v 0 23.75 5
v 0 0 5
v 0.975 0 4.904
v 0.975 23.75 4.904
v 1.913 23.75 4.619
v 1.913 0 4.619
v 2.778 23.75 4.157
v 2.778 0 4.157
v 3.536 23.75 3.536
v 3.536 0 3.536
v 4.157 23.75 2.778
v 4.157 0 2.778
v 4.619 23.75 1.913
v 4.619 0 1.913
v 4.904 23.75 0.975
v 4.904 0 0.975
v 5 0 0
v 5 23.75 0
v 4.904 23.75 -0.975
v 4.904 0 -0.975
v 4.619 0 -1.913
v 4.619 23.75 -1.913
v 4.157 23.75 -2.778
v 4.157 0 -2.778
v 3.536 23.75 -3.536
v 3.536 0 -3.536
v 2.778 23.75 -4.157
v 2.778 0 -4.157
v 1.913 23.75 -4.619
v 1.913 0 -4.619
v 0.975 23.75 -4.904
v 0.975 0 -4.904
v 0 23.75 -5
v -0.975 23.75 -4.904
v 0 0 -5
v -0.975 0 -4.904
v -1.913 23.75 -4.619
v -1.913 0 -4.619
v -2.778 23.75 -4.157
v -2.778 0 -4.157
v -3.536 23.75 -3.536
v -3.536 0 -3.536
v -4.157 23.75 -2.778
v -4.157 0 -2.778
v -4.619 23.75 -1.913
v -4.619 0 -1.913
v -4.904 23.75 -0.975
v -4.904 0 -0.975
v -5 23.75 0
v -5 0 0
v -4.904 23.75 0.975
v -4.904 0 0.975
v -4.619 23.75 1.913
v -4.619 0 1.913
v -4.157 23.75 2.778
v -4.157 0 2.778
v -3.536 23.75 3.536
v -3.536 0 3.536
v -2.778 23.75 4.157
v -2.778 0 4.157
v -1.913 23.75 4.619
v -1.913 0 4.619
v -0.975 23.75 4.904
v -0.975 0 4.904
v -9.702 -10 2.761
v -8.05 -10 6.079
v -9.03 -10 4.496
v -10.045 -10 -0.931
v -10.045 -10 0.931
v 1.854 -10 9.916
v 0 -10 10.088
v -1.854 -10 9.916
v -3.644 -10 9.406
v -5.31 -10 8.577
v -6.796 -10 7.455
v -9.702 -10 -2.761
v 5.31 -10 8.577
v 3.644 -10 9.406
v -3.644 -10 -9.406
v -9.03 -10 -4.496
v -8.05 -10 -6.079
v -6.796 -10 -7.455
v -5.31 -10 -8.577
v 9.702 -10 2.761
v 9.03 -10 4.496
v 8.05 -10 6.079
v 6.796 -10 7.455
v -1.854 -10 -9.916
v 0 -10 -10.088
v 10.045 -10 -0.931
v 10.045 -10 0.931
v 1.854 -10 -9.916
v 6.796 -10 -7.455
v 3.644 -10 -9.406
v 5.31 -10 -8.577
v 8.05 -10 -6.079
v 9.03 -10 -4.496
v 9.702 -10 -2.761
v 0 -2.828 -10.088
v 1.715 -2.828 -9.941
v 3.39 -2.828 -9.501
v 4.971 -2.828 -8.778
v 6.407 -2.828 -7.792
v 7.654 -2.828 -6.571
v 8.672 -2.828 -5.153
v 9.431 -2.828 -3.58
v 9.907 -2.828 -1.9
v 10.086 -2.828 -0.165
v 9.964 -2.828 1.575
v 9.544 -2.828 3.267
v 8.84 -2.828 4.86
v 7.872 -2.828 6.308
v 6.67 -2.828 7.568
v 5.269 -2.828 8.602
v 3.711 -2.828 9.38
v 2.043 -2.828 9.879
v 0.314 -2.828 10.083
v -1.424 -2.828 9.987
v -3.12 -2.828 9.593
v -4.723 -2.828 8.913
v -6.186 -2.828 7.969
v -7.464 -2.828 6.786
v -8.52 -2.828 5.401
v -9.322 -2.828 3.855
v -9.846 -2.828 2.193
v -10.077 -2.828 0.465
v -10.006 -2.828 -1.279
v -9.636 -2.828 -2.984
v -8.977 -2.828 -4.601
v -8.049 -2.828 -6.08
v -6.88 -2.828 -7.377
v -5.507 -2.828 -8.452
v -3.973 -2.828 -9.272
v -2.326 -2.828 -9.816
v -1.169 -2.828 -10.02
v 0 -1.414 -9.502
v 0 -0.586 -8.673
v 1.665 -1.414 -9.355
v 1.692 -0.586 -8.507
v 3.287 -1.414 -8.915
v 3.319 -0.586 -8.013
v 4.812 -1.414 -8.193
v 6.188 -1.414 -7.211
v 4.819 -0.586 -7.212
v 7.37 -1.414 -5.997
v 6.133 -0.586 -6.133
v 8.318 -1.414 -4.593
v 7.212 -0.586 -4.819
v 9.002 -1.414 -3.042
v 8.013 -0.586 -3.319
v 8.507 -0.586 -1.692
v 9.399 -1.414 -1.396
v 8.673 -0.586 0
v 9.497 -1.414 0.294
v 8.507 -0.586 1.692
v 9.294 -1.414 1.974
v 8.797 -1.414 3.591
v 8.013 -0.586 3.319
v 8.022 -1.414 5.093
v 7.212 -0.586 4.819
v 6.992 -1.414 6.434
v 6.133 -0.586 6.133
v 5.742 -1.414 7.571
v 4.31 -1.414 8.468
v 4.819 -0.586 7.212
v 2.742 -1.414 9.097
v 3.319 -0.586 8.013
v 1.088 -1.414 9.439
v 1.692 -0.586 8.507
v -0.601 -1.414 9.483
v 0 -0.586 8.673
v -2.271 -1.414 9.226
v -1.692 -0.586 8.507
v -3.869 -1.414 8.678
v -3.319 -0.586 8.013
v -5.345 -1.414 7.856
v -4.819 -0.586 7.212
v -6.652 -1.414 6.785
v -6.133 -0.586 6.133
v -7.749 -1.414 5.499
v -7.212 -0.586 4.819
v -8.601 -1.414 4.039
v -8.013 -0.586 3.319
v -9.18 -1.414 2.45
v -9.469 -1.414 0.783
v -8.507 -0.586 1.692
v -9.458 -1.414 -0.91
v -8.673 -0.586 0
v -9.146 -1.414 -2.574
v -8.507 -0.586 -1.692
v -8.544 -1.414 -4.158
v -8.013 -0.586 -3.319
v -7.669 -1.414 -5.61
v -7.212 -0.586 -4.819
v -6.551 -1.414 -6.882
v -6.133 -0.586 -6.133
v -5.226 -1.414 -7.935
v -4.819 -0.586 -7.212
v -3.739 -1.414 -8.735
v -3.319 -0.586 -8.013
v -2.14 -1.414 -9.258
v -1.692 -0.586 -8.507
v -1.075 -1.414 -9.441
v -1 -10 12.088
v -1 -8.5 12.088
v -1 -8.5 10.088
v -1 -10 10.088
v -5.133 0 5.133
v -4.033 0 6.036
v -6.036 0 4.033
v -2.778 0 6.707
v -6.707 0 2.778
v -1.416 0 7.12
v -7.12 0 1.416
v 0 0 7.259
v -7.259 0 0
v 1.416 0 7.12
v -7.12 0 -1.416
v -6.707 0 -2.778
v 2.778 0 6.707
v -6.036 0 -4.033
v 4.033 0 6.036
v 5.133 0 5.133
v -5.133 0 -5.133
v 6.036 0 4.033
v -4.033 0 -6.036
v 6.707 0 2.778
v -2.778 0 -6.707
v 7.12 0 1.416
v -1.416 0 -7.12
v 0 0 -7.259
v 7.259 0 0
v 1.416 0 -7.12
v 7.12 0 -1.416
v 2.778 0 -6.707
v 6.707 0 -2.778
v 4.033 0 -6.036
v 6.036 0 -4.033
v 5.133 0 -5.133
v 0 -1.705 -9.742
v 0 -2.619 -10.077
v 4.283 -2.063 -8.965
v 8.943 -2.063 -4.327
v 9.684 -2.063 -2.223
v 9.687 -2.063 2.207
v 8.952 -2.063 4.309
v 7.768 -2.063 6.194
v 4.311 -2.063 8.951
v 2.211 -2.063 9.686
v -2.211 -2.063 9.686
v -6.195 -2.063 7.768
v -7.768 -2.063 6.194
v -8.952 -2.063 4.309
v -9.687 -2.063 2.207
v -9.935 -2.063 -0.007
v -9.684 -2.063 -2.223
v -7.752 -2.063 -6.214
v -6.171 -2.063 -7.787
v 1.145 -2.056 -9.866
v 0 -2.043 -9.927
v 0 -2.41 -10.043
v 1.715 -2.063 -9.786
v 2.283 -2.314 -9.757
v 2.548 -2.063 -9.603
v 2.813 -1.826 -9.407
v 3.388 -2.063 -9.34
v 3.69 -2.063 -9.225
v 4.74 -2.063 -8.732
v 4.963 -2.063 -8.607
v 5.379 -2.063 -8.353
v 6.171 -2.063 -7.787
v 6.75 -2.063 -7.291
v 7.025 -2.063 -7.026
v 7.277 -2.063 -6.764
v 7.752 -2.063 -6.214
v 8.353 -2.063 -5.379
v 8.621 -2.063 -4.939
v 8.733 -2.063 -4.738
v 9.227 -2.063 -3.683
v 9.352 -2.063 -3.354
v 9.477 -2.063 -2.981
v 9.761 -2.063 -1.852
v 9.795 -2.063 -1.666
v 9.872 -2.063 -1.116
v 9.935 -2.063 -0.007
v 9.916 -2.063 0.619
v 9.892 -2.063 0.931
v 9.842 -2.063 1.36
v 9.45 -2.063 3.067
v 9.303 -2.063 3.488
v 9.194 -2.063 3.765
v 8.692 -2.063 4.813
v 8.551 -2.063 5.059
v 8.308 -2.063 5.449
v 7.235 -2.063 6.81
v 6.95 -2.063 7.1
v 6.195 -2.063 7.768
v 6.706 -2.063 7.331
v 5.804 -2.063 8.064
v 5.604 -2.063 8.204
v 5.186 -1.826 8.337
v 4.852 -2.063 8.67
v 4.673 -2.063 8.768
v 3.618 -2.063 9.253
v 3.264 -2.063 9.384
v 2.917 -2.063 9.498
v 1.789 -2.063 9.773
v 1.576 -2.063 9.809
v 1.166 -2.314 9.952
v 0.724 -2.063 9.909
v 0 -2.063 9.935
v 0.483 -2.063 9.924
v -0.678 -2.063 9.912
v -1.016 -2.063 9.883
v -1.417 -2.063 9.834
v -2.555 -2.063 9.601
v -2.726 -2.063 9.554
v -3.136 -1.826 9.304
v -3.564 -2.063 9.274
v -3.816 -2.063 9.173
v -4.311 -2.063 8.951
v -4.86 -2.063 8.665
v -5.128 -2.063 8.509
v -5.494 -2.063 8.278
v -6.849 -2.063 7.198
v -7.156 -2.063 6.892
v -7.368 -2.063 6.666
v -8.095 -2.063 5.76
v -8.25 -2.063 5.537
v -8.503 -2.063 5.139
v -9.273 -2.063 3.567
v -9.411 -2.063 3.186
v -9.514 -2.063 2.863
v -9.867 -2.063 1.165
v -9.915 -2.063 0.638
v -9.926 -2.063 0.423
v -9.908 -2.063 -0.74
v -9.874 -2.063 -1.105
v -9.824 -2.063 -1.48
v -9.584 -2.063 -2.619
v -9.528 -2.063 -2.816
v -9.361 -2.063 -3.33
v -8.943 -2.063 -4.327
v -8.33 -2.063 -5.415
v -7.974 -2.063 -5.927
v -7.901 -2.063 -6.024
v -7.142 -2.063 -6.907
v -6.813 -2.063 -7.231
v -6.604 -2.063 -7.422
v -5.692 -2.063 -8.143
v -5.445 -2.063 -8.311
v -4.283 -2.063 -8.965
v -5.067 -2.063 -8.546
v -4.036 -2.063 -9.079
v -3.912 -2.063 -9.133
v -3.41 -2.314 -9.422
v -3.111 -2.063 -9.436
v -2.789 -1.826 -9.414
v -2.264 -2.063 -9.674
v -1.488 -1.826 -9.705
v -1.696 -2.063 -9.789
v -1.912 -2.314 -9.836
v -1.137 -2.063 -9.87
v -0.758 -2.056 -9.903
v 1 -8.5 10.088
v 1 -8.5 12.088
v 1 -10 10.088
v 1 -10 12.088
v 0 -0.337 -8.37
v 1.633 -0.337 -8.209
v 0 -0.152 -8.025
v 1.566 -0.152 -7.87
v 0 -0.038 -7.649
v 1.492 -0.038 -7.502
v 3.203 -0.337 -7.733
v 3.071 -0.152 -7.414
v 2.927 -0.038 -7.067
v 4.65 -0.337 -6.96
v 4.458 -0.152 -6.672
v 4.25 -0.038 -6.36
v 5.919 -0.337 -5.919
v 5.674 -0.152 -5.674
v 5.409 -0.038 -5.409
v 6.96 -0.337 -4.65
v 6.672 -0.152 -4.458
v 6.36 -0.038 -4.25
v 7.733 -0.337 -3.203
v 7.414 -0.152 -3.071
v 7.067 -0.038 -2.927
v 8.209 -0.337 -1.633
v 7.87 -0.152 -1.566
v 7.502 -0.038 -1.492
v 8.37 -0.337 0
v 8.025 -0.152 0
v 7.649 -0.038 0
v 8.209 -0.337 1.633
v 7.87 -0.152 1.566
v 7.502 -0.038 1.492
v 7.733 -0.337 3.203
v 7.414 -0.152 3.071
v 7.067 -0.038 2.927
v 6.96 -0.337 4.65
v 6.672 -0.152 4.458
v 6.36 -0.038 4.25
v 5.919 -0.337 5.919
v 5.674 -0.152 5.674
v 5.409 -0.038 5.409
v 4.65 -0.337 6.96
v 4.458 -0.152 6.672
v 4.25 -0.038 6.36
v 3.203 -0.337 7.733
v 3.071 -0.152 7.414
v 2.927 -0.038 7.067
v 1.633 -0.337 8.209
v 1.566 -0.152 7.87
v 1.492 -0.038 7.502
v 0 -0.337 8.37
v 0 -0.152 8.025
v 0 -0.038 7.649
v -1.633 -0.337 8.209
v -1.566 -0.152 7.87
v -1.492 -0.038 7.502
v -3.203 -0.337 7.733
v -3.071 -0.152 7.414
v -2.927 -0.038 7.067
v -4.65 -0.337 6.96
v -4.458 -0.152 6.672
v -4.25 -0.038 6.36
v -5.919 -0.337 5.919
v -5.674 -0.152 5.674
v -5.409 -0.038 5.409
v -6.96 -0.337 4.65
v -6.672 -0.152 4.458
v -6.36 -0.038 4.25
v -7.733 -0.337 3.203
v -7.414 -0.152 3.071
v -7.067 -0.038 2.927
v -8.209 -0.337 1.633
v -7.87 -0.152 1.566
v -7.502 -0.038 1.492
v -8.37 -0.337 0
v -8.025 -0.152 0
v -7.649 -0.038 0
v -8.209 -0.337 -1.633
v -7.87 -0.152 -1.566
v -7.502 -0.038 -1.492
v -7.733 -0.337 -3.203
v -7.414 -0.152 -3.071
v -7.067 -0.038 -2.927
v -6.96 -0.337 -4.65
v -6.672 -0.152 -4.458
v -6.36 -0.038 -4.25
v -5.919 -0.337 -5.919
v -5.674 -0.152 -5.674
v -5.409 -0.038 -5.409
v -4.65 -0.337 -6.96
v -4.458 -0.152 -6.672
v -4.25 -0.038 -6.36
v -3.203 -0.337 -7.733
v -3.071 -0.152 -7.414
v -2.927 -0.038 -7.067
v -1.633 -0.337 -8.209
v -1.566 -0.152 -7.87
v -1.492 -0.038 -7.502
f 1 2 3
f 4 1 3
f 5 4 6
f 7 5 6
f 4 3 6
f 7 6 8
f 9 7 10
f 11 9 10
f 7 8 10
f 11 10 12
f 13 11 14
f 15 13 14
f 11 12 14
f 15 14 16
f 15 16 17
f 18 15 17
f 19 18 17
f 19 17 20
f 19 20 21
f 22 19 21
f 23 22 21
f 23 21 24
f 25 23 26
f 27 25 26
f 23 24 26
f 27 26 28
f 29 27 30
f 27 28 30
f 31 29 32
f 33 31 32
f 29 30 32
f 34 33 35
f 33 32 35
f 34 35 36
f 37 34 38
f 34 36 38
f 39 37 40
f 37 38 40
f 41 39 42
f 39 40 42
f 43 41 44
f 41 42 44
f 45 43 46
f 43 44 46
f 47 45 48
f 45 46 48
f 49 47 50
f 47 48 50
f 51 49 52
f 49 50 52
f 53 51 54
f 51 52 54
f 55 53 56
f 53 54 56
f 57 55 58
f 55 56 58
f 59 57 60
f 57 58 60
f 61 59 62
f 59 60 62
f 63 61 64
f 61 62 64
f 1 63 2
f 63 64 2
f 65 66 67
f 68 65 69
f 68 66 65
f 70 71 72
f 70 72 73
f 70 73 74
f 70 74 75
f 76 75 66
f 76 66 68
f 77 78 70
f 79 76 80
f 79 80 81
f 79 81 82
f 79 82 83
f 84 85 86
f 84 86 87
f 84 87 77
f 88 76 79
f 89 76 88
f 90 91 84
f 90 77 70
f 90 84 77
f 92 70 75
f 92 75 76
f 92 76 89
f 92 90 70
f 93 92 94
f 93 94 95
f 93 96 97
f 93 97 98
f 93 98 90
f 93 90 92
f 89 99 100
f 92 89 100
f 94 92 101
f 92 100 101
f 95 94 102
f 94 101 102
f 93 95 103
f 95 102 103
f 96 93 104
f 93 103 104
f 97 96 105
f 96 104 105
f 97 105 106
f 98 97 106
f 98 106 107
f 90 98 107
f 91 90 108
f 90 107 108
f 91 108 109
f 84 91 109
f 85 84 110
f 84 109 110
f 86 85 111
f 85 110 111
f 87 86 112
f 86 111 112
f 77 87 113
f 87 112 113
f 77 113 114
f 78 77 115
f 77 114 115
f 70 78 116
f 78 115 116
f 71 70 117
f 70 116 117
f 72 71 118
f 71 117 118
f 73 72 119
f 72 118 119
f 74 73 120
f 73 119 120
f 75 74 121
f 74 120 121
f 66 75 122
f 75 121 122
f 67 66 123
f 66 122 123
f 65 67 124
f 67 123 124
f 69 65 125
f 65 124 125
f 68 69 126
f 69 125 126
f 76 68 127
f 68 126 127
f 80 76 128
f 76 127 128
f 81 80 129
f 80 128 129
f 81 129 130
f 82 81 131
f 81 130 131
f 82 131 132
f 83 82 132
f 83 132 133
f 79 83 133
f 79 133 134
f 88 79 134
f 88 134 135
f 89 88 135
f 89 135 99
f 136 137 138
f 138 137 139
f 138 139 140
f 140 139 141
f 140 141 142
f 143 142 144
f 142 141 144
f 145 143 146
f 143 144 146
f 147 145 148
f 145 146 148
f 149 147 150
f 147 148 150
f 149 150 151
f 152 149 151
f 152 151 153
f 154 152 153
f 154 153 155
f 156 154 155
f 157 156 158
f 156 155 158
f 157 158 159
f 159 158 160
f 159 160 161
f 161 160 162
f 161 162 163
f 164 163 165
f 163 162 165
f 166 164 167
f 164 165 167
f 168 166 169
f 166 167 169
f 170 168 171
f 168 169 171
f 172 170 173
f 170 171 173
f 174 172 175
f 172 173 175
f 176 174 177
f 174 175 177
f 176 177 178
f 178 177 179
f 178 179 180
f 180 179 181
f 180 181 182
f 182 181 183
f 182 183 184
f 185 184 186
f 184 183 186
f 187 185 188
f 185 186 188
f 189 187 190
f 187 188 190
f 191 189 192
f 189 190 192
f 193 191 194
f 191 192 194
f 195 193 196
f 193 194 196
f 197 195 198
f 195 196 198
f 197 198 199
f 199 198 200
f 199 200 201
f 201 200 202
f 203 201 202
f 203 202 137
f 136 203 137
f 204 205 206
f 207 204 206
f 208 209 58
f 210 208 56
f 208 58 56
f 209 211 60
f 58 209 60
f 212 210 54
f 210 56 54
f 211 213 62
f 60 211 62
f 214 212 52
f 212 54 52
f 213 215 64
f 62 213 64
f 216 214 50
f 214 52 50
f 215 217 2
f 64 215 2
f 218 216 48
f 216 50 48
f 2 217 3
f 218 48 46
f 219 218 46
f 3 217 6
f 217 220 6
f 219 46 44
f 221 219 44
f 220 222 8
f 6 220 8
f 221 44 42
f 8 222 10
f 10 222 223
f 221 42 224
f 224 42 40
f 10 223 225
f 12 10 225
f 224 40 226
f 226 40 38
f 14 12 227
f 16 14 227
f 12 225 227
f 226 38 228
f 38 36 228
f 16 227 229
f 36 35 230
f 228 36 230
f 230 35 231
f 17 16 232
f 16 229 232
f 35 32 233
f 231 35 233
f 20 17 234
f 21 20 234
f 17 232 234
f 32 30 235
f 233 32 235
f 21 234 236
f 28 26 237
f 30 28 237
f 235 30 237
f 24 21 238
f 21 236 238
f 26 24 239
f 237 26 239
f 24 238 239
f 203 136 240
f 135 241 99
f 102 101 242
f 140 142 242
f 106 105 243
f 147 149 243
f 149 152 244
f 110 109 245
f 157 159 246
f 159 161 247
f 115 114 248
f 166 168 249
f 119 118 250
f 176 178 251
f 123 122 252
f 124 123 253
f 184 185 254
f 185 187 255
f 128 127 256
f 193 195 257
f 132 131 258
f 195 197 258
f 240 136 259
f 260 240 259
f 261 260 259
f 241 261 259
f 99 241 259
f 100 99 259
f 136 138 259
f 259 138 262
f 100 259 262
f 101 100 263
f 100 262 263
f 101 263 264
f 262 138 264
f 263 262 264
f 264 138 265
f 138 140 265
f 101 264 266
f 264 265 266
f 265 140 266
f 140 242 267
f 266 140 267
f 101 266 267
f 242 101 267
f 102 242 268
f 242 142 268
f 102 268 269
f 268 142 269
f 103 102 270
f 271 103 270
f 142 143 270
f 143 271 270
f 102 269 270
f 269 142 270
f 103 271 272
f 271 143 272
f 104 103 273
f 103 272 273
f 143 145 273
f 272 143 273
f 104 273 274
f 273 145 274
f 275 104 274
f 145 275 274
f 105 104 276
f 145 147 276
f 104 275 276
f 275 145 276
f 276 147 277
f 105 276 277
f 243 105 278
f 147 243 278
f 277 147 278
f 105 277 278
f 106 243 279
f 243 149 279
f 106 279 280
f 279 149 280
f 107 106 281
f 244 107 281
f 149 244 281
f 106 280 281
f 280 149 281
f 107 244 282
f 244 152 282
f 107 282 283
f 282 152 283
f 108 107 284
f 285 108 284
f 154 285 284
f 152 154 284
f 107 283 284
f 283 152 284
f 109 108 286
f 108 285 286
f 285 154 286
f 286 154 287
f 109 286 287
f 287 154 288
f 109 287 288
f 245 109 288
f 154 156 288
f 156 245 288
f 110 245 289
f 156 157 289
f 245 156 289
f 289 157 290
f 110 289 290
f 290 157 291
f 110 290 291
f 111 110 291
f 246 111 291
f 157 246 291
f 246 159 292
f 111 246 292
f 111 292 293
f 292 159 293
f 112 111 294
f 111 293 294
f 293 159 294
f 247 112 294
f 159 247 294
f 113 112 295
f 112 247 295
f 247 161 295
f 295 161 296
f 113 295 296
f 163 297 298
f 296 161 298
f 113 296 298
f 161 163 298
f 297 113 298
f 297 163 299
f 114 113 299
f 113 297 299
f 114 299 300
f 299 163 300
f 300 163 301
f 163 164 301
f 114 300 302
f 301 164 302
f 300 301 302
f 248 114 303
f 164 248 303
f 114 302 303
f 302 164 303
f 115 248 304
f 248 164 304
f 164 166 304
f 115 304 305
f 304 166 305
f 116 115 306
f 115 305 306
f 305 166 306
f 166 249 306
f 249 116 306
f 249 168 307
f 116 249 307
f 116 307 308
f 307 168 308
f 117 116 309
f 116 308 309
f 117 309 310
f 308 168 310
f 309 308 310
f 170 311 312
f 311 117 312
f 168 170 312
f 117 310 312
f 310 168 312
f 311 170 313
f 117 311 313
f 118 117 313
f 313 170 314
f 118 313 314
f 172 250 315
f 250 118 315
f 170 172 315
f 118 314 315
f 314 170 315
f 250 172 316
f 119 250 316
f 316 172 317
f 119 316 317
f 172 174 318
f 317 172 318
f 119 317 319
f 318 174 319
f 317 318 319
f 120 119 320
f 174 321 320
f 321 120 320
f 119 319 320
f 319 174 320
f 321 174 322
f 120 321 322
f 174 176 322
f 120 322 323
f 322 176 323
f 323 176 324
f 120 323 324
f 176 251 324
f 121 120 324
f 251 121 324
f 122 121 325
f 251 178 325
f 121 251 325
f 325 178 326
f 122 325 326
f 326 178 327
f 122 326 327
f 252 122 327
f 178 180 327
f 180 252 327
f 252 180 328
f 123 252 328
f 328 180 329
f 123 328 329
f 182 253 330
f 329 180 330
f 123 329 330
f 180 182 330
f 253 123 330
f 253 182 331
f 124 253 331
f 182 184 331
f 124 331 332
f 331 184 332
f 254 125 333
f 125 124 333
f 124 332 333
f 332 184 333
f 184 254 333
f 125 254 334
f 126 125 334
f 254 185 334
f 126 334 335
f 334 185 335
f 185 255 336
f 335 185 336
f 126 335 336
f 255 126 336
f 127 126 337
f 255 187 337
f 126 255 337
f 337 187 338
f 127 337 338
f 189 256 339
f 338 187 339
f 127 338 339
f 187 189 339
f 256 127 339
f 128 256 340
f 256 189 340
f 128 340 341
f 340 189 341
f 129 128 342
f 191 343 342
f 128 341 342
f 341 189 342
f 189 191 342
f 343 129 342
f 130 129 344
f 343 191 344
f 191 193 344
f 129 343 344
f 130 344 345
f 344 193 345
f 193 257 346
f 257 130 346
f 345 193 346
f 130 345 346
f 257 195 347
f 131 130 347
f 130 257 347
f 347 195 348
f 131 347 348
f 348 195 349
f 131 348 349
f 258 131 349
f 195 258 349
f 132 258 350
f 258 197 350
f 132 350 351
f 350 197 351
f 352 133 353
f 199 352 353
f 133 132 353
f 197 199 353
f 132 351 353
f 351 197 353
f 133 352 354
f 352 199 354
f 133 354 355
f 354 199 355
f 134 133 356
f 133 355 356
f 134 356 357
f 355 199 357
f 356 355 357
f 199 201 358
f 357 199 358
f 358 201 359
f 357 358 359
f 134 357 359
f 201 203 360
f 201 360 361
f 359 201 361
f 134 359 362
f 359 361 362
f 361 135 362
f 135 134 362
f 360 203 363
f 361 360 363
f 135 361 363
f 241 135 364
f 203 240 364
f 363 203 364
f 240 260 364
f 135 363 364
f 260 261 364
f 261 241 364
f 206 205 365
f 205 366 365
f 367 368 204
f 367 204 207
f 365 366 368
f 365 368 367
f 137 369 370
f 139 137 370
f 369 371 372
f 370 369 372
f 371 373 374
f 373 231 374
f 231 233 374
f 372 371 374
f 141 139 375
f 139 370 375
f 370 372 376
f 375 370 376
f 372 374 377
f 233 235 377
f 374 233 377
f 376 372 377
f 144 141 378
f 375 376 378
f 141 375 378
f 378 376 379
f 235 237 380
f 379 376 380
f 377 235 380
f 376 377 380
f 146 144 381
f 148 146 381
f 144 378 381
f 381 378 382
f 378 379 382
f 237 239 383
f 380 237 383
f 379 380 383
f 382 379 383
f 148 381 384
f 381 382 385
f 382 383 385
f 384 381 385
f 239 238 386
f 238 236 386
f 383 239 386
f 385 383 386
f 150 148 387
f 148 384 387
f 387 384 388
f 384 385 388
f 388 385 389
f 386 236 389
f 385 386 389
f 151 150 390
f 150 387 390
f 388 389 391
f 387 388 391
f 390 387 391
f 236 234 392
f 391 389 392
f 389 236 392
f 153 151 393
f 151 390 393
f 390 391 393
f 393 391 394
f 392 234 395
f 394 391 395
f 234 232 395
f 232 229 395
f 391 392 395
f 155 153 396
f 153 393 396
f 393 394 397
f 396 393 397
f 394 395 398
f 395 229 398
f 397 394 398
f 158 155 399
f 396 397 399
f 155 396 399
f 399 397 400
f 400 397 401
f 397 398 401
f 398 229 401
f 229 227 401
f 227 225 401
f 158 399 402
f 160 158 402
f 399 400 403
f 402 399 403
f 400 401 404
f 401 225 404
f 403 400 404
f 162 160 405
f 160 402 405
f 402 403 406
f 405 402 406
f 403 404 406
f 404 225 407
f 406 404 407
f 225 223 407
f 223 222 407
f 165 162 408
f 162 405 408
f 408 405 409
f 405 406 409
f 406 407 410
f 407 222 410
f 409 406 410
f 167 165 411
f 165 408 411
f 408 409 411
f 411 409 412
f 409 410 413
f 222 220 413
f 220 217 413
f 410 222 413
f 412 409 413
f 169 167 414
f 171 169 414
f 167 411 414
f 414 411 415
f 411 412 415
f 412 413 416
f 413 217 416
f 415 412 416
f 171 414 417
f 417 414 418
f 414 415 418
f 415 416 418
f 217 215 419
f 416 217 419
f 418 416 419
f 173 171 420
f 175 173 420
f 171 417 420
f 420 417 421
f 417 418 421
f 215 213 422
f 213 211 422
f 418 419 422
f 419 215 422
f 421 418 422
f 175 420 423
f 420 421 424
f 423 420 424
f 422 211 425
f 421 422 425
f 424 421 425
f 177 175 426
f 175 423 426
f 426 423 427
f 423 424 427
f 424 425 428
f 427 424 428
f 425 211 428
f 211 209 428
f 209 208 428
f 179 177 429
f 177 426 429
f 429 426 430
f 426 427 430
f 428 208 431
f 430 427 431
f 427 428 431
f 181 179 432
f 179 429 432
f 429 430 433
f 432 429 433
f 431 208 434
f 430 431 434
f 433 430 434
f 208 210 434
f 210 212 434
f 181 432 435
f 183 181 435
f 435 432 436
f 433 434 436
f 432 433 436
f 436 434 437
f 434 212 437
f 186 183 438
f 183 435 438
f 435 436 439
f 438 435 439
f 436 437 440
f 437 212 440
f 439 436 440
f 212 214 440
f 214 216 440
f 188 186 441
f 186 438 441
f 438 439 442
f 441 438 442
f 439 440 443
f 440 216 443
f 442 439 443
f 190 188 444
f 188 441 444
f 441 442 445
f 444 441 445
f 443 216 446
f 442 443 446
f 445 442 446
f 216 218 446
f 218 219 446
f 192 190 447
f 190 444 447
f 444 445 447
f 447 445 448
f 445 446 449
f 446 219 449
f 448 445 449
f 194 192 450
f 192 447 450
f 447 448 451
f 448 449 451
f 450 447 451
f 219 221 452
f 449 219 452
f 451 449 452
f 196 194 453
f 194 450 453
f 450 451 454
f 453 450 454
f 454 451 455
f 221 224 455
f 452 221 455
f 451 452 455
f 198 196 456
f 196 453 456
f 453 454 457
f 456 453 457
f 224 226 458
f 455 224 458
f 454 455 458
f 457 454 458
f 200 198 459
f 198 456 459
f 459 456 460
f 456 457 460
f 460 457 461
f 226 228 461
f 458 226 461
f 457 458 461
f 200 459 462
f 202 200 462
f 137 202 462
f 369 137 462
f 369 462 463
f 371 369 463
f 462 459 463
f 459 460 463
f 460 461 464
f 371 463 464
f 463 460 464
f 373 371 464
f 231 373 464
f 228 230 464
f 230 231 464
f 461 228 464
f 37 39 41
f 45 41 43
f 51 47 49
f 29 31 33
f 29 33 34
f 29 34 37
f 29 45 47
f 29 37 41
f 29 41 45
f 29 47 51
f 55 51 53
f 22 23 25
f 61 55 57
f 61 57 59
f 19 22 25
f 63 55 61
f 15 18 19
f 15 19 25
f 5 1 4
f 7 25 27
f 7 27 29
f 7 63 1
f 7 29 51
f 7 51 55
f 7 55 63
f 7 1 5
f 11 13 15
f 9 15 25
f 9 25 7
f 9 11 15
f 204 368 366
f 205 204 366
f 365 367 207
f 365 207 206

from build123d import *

# Parameters (mm, degrees)
SKETCH2_R           = 5
BOSS_EXTRUDE1_DEPTH = 23.75
SKETCH3_R           = 10.087575419
BOSS_EXTRUDE2_DEPTH = 10
CHAMFER1_SIZE       = 2
FILLET2_R           = 2
FILLET3_R           = 2
SKETCH4_W           = 2
SKETCH4_H           = 1.5
BOSS_EXTRUDE3_DEPTH = 1


with BuildPart() as part:
    # Sketch2 → Boss-Extrude1 (new body)
    with BuildSketch(Plane(origin=(0, 0, 0), x_dir=(1, 0, 0), z_dir=(0, 1, 0))):
        with Locations(Location((0, 0, 0), (0, 0, 270))):
            Circle(SKETCH2_R)
    extrude(amount=BOSS_EXTRUDE1_DEPTH)

    # Sketch3 → Boss-Extrude2 (add)
    with BuildSketch(Plane.XZ):
        with Locations(Location((0, 0, 0), (0, 0, 270))):
            Circle(SKETCH3_R)
    extrude(amount=BOSS_EXTRUDE2_DEPTH)

    # Chamfer1
    chamfer1_edges = [part.edges().sort_by_distance(p)[0] for p in [
        (0, 0, 10.087575419),
    ]]
    chamfer(chamfer1_edges, length=CHAMFER1_SIZE)

    # Fillet2
    fillet2_edges = [part.edges().sort_by_distance(p)[0] for p in [
        (0, 0, 8.087575419),
    ]]
    fillet(fillet2_edges, radius=FILLET2_R)

    # Fillet3
    fillet3_edges = [part.edges().sort_by_distance(p)[0] for p in [
        (0, -2, 10.087575419),
    ]]
    fillet(fillet3_edges, radius=FILLET3_R)


with BuildPart() as body_2:
    # Sketch4 → Boss-Extrude3 (new, symmetric)
    with BuildSketch(Plane(origin=(0, 0, 0), x_dir=(0, 0, -1), z_dir=(1, 0, 0))):
        with Locations((-11.087575419, -9.25)):
            Rectangle(SKETCH4_W, SKETCH4_H)
    extrude(amount=BOSS_EXTRUDE3_DEPTH, both=True)


solid = Compound([part.part, body_2.part])
